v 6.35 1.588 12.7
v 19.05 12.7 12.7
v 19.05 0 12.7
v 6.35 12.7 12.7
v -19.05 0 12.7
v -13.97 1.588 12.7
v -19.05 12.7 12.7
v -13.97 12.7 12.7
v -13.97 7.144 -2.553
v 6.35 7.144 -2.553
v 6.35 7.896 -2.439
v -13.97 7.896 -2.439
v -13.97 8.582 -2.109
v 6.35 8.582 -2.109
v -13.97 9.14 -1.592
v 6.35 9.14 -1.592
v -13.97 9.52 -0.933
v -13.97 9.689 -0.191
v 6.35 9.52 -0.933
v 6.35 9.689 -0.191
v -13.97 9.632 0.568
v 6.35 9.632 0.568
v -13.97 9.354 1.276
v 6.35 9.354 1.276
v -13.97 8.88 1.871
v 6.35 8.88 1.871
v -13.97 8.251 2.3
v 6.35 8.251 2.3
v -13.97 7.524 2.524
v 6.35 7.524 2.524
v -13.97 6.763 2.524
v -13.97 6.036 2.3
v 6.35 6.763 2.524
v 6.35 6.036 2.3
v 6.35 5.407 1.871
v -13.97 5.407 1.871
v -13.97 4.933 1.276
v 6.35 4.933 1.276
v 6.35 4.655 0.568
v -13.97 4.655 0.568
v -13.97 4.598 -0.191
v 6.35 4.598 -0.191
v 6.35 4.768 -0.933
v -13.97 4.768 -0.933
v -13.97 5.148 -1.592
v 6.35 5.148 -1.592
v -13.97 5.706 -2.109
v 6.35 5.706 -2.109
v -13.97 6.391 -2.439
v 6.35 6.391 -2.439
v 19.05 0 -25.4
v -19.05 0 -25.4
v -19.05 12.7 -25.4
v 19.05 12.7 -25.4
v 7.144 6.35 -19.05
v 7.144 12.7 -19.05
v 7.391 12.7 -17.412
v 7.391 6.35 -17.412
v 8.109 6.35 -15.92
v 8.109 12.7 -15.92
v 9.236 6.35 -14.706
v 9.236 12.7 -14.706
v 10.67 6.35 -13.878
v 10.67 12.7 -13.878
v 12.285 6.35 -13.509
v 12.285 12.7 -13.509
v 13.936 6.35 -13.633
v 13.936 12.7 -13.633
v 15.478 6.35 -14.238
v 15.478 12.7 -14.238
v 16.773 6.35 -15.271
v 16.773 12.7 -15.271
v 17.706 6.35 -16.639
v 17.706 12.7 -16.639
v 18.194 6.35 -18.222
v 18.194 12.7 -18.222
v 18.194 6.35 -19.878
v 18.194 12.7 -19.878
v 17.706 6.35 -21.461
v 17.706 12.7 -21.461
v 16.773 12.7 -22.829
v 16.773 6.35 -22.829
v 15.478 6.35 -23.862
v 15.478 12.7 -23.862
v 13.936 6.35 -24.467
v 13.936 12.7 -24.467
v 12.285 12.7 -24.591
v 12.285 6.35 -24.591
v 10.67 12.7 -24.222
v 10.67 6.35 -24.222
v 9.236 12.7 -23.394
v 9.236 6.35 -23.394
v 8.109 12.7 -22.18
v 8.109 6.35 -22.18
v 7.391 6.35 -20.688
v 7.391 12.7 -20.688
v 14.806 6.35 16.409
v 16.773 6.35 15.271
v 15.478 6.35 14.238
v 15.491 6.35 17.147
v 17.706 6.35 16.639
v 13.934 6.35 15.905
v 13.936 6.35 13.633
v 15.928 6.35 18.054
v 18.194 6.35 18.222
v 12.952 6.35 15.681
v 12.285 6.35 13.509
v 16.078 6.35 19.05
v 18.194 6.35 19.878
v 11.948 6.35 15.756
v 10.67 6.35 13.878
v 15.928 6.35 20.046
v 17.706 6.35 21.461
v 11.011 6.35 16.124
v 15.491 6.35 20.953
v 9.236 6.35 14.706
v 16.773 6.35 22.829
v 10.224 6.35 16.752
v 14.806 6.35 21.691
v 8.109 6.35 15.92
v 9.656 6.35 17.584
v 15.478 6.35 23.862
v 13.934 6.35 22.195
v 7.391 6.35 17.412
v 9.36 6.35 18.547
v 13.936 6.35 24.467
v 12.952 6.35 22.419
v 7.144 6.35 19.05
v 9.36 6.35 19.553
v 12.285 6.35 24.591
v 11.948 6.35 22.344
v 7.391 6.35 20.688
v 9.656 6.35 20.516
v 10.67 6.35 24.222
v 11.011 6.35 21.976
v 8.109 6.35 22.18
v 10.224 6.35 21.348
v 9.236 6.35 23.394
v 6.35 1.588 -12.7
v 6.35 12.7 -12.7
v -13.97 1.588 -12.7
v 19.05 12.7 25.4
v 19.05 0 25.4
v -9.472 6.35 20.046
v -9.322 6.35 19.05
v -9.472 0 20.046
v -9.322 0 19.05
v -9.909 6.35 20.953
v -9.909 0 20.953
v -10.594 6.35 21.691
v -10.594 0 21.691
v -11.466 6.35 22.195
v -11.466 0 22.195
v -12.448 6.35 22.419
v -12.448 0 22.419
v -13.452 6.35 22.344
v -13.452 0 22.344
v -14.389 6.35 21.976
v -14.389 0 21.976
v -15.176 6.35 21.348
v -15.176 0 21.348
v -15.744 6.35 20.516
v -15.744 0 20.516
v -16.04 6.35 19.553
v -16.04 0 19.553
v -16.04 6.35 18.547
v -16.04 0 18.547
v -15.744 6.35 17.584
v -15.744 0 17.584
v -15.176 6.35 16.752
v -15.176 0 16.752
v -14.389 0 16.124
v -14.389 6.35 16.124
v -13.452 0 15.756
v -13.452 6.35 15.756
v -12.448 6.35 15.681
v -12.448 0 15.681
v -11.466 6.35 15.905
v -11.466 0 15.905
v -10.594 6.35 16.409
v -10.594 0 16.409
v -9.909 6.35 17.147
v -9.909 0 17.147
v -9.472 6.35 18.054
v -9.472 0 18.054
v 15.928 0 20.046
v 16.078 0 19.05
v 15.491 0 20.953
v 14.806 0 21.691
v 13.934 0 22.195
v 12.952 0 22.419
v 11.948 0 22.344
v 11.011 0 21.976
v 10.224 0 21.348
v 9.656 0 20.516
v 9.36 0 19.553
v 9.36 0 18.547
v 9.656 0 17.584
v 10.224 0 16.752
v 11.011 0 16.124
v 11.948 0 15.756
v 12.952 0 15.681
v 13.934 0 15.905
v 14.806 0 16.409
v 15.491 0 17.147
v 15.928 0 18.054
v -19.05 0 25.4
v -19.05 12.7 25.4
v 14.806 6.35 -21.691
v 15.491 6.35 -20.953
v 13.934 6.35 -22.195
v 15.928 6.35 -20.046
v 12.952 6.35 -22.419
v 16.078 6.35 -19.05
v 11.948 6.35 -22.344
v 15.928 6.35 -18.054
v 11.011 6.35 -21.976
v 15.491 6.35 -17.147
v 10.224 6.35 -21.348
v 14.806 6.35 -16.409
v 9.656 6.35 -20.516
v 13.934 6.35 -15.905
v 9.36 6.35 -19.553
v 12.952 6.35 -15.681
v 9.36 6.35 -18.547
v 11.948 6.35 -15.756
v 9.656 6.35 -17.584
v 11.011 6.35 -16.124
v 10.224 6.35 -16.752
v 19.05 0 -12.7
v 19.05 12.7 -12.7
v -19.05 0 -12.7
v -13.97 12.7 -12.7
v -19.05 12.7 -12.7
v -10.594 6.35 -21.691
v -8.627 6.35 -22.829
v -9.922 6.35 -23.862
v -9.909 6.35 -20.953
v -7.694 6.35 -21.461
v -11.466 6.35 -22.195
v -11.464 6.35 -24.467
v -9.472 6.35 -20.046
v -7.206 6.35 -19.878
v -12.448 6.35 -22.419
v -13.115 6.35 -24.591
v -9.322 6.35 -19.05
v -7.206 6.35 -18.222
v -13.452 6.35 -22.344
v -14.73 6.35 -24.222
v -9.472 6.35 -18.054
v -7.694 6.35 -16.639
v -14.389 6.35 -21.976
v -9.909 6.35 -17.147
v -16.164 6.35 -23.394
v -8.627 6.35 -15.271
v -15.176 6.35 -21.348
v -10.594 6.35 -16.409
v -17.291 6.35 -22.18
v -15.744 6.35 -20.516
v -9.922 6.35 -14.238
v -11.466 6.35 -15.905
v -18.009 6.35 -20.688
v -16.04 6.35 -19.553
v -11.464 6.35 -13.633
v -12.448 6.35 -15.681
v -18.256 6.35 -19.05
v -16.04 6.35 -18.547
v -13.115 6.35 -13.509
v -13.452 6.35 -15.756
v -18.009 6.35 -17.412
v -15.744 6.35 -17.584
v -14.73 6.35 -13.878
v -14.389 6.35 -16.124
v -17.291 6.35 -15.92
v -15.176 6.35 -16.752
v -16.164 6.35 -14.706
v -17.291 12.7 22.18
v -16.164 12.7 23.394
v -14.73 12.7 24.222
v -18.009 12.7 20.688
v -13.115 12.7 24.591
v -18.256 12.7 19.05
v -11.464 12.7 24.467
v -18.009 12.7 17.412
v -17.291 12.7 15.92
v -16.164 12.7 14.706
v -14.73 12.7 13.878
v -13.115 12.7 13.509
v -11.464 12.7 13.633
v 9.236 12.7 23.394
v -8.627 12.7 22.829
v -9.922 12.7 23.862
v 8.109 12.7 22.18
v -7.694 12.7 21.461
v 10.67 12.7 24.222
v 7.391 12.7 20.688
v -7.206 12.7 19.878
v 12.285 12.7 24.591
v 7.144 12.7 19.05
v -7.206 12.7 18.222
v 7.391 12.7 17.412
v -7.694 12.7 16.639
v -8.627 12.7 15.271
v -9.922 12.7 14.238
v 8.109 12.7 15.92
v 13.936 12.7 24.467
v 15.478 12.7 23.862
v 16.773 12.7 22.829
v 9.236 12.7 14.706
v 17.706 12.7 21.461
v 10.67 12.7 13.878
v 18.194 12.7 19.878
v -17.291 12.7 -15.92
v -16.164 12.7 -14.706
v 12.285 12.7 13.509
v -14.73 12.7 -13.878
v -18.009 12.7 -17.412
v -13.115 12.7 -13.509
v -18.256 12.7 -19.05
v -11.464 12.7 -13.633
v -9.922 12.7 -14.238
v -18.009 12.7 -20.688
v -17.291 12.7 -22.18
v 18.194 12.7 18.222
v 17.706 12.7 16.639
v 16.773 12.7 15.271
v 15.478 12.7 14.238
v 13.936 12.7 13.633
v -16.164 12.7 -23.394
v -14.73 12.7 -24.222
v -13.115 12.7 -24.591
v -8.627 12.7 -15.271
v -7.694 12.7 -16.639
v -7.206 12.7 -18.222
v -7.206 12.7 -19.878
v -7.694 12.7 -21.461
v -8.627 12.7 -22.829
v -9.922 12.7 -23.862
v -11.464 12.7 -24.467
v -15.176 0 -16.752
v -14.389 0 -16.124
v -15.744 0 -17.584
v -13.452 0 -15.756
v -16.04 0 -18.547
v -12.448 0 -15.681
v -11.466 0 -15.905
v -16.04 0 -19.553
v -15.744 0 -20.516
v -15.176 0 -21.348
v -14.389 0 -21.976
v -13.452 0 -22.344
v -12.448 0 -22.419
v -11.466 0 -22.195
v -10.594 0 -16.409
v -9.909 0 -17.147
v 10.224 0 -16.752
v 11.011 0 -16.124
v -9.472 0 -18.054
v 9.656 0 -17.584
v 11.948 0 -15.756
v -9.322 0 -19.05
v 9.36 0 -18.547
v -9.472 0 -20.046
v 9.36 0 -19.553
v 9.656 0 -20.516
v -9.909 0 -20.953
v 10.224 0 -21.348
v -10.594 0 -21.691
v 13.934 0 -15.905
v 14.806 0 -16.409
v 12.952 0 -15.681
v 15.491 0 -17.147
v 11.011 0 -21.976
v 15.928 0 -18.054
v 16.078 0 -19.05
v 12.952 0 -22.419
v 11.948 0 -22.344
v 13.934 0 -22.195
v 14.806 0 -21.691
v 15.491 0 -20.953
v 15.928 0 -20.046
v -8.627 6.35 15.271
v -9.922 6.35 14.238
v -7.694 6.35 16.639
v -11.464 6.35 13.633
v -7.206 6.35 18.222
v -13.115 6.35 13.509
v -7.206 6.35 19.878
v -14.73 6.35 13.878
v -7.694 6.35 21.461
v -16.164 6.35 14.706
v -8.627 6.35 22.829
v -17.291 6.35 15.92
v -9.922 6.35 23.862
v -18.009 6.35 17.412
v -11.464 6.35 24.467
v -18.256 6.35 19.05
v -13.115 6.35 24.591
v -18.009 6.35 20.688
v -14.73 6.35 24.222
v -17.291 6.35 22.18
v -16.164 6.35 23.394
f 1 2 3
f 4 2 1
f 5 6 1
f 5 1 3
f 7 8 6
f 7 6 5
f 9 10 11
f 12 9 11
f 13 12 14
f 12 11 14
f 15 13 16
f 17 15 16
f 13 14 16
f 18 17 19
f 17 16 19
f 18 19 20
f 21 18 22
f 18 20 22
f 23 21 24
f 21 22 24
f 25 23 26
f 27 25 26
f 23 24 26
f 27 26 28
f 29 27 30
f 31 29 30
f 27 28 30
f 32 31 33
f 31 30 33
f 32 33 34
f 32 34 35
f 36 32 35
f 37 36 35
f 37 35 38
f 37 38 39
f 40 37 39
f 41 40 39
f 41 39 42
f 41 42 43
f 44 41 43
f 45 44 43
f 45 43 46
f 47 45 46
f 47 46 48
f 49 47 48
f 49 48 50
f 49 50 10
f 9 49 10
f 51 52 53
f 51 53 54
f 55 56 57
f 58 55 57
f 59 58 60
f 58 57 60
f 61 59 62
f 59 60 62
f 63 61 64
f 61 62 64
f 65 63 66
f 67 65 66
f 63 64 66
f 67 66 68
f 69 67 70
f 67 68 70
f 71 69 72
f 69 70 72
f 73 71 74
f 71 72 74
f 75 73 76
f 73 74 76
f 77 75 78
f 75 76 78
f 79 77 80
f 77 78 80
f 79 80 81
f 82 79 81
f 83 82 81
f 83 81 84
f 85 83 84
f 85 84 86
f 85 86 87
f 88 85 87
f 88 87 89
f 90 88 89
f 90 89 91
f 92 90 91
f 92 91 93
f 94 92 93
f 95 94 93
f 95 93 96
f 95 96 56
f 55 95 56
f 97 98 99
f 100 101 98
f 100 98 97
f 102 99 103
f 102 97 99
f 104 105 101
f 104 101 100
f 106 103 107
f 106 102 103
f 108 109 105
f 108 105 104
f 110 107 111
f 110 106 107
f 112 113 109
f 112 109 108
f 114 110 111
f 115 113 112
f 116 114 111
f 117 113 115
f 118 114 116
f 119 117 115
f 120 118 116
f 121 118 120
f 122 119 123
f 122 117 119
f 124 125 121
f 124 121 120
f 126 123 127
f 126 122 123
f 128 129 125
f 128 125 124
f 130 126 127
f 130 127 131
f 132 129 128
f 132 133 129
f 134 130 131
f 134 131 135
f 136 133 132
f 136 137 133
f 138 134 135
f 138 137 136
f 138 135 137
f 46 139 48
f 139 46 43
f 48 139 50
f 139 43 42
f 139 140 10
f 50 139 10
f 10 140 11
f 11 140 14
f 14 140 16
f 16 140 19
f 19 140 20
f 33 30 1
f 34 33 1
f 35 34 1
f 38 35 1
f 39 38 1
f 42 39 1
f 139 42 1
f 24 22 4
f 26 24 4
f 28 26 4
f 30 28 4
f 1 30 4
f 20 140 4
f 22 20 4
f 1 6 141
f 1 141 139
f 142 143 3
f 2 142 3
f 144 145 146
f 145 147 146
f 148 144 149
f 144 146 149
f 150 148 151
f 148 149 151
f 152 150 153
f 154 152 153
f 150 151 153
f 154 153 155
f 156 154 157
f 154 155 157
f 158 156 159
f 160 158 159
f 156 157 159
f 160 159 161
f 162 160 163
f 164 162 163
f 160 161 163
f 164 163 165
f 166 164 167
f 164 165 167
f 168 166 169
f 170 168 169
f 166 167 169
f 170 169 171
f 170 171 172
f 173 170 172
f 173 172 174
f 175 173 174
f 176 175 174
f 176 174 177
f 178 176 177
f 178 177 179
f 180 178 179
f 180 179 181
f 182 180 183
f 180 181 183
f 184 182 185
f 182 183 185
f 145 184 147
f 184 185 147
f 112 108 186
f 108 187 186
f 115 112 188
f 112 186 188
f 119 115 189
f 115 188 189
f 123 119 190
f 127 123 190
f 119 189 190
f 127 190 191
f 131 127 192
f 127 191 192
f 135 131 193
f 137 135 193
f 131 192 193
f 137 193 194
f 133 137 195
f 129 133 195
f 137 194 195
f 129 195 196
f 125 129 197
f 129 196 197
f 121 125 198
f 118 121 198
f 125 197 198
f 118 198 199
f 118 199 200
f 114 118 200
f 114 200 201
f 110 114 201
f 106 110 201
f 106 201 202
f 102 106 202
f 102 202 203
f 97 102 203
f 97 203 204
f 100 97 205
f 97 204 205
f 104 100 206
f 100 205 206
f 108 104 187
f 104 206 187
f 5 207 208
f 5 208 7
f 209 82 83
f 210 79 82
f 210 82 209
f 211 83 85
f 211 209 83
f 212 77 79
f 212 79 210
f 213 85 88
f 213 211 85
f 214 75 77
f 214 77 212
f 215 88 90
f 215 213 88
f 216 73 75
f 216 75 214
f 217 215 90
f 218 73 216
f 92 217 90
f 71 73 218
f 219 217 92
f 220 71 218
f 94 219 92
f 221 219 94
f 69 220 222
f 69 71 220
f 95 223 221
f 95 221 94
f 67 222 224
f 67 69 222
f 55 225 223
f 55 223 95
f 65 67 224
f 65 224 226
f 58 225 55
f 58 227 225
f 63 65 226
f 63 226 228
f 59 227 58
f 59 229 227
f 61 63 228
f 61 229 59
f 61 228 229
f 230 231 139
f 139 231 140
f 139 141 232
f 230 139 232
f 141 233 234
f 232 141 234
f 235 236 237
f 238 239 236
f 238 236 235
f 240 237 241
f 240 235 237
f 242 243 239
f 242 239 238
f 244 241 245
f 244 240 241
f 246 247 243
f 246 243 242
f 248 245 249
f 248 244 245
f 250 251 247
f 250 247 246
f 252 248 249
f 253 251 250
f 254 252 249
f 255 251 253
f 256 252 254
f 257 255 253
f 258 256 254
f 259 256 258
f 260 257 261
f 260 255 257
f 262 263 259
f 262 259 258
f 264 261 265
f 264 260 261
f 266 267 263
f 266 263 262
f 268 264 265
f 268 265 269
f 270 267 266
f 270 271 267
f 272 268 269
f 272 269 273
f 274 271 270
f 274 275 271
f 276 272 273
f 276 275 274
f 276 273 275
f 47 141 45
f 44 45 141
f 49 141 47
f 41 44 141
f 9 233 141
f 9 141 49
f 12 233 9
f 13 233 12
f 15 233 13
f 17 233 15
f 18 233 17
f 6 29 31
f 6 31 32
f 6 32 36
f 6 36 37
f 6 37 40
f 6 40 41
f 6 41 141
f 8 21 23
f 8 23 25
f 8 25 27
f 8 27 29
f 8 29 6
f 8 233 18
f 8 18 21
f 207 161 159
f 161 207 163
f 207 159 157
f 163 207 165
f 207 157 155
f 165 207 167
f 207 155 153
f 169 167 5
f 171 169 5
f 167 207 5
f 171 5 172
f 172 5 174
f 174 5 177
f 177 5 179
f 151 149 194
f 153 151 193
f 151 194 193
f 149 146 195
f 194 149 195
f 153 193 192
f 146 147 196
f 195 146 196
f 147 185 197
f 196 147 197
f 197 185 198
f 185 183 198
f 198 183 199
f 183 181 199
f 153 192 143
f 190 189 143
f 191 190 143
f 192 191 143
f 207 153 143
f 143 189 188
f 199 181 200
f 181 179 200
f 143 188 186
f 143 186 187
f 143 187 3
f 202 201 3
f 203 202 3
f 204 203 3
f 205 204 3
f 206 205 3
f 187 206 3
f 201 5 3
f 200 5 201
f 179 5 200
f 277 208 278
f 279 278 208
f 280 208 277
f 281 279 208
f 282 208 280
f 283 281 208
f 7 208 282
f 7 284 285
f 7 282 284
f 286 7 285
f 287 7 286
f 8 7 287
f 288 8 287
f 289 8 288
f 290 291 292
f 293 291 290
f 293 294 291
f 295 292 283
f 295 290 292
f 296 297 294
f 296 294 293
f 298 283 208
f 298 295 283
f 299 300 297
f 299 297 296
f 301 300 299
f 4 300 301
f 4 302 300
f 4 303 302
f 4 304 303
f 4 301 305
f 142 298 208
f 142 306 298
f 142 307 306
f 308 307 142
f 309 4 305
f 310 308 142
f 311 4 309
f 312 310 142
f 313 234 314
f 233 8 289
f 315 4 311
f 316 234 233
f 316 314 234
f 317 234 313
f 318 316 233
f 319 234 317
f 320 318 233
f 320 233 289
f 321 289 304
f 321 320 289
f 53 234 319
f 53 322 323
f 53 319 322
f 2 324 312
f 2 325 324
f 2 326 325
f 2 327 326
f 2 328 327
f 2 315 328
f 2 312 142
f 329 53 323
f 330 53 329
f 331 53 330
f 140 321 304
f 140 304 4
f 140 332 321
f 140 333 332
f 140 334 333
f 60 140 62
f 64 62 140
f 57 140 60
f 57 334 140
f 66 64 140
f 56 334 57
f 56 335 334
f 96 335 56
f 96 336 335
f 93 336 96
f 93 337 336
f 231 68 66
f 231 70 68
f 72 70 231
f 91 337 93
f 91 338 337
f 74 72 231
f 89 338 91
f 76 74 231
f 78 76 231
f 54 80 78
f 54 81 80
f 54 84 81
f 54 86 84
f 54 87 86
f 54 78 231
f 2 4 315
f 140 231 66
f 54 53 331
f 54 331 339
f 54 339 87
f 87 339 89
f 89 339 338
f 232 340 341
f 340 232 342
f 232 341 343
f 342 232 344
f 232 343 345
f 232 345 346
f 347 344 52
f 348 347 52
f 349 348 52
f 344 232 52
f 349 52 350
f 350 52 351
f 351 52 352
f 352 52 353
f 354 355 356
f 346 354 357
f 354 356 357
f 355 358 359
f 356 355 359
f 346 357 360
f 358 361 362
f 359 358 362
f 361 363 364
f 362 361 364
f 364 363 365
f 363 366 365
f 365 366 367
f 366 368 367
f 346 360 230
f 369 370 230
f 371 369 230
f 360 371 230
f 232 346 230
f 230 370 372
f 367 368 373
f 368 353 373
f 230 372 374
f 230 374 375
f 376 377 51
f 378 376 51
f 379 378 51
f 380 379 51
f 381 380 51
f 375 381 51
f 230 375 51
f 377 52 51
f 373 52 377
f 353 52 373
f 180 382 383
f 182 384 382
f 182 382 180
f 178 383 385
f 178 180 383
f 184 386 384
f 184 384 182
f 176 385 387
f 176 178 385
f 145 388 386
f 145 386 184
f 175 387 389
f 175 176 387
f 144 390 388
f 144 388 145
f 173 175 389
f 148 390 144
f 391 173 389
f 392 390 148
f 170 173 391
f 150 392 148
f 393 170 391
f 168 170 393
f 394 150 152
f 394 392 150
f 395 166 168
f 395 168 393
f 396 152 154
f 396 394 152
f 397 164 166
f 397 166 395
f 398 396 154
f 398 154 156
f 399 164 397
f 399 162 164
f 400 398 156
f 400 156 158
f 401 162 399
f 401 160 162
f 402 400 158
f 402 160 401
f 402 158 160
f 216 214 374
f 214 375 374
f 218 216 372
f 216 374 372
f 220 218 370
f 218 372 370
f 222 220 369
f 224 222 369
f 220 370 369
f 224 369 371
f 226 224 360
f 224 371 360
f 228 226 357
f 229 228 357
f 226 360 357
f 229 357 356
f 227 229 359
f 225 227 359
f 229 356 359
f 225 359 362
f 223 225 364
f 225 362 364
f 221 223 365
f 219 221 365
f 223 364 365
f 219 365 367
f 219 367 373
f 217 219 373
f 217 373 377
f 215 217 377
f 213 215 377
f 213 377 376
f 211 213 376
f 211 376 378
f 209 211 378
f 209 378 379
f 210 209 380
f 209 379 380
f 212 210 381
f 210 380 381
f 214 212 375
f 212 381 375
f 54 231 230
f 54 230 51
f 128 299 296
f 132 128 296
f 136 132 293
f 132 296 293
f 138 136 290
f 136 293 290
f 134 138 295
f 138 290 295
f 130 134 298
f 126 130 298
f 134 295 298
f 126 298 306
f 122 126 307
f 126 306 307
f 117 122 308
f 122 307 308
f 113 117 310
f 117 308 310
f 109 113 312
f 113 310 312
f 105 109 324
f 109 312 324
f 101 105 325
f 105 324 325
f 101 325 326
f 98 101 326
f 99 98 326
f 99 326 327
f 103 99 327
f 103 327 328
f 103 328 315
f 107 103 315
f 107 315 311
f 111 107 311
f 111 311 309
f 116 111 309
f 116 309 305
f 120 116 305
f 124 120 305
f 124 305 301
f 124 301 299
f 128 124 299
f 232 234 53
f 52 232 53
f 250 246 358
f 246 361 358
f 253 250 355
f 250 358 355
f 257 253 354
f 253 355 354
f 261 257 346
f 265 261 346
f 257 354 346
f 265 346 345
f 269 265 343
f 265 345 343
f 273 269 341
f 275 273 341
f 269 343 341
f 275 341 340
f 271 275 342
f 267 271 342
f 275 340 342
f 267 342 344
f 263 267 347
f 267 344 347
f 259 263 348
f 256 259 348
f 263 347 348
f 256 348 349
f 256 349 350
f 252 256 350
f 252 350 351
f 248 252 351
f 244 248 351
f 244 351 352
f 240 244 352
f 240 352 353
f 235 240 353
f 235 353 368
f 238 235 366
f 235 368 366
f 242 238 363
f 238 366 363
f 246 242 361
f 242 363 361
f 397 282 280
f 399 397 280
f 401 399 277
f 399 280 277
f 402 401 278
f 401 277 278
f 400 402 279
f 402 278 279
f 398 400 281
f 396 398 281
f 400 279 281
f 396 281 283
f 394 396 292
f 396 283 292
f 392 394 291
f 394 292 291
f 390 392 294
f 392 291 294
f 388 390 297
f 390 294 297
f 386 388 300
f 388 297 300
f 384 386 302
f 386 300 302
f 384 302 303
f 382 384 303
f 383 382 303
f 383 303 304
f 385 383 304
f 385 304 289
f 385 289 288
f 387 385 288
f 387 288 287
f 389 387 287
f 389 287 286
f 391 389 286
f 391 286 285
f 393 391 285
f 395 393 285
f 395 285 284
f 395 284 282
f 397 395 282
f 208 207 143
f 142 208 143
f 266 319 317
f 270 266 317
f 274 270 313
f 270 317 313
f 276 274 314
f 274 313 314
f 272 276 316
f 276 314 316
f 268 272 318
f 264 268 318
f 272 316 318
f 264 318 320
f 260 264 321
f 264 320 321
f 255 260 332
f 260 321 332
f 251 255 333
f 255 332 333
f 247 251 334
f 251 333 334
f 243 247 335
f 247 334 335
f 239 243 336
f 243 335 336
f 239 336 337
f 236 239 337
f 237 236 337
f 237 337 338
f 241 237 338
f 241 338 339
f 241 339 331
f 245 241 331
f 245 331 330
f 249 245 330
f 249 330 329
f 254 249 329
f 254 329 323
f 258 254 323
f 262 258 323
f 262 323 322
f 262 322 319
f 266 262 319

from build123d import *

# Parameters (mm, degrees)
SKETCH1_W                                        = 38.1
SKETCH1_H                                        = 50.8
EXTRUDE1_DEPTH                                   = 12.7
CBORE_FOR_1_4_SOCKET_HEAD_CAP_SCREW1_D           = 6.7564
CBORE_FOR_1_4_SOCKET_HEAD_CAP_SCREW1_CBORE_D     = 11.1125
CBORE_FOR_1_4_SOCKET_HEAD_CAP_SCREW1_CBORE_DEPTH = 6.35
SKETCH3_W                                        = 5.08
SKETCH3_H                                        = 25.4
SKETCH3_W_2                                      = 12.7
CUT_EXTRUDE2_DEPTH                               = 35.195796525
SKETCH5_W                                        = 20.32
SKETCH5_H                                        = 25.4
CUT_EXTRUDE4_DEPTH                               = 1.5875
F_1_4_20_TAPPED_HOLE1_D                          = 5.1054


with BuildPart() as part:
    # Sketch1 → Extrude1 (new body)
    with BuildSketch(Plane(origin=(0, 0, 0), x_dir=(1, 0, 0), z_dir=(0, 1, 0))):
        Rectangle(SKETCH1_W, SKETCH1_H)
    extrude(amount=EXTRUDE1_DEPTH)

    # CBORE for 1/4 Socket Head Cap Screw1 (through all)
    with Locations(Plane(origin=(0, 12.7, 0), x_dir=(-1, 0, 0), z_dir=(0, 1, 0))):
        with Locations((12.7, -19.05), (-12.7, -19.05), (-12.7, 19.05), (12.7, 19.05)):
            CounterBoreHole(CBORE_FOR_1_4_SOCKET_HEAD_CAP_SCREW1_D / 2, CBORE_FOR_1_4_SOCKET_HEAD_CAP_SCREW1_CBORE_D / 2, CBORE_FOR_1_4_SOCKET_HEAD_CAP_SCREW1_CBORE_DEPTH)

    # Sketch3 → Cut-Extrude2 (cut, through all)
    with BuildSketch(Plane(origin=(0, 12.7, 0), x_dir=(-1, 0, 0), z_dir=(0, 1, 0))):
        with Locations((16.51, 0)):
            Rectangle(SKETCH3_W, SKETCH3_H)
        with Locations((-12.7, 0)):
            Rectangle(SKETCH3_W_2, SKETCH3_H)
    extrude(amount=-CUT_EXTRUDE2_DEPTH, mode=Mode.SUBTRACT)

    # Sketch5 → Cut-Extrude4 (cut)
    with BuildSketch(Plane.XZ):
        with Locations((-3.81, 0)):
            Rectangle(SKETCH5_W, SKETCH5_H)
    extrude(amount=-CUT_EXTRUDE4_DEPTH, mode=Mode.SUBTRACT)

    # 1/4-20 Tapped Hole1 (through all)
    with Locations(Plane.ZY.offset(13.97)):
        with Locations((0, 7.14375)):
            Hole(F_1_4_20_TAPPED_HOLE1_D / 2)


solid = part.part
